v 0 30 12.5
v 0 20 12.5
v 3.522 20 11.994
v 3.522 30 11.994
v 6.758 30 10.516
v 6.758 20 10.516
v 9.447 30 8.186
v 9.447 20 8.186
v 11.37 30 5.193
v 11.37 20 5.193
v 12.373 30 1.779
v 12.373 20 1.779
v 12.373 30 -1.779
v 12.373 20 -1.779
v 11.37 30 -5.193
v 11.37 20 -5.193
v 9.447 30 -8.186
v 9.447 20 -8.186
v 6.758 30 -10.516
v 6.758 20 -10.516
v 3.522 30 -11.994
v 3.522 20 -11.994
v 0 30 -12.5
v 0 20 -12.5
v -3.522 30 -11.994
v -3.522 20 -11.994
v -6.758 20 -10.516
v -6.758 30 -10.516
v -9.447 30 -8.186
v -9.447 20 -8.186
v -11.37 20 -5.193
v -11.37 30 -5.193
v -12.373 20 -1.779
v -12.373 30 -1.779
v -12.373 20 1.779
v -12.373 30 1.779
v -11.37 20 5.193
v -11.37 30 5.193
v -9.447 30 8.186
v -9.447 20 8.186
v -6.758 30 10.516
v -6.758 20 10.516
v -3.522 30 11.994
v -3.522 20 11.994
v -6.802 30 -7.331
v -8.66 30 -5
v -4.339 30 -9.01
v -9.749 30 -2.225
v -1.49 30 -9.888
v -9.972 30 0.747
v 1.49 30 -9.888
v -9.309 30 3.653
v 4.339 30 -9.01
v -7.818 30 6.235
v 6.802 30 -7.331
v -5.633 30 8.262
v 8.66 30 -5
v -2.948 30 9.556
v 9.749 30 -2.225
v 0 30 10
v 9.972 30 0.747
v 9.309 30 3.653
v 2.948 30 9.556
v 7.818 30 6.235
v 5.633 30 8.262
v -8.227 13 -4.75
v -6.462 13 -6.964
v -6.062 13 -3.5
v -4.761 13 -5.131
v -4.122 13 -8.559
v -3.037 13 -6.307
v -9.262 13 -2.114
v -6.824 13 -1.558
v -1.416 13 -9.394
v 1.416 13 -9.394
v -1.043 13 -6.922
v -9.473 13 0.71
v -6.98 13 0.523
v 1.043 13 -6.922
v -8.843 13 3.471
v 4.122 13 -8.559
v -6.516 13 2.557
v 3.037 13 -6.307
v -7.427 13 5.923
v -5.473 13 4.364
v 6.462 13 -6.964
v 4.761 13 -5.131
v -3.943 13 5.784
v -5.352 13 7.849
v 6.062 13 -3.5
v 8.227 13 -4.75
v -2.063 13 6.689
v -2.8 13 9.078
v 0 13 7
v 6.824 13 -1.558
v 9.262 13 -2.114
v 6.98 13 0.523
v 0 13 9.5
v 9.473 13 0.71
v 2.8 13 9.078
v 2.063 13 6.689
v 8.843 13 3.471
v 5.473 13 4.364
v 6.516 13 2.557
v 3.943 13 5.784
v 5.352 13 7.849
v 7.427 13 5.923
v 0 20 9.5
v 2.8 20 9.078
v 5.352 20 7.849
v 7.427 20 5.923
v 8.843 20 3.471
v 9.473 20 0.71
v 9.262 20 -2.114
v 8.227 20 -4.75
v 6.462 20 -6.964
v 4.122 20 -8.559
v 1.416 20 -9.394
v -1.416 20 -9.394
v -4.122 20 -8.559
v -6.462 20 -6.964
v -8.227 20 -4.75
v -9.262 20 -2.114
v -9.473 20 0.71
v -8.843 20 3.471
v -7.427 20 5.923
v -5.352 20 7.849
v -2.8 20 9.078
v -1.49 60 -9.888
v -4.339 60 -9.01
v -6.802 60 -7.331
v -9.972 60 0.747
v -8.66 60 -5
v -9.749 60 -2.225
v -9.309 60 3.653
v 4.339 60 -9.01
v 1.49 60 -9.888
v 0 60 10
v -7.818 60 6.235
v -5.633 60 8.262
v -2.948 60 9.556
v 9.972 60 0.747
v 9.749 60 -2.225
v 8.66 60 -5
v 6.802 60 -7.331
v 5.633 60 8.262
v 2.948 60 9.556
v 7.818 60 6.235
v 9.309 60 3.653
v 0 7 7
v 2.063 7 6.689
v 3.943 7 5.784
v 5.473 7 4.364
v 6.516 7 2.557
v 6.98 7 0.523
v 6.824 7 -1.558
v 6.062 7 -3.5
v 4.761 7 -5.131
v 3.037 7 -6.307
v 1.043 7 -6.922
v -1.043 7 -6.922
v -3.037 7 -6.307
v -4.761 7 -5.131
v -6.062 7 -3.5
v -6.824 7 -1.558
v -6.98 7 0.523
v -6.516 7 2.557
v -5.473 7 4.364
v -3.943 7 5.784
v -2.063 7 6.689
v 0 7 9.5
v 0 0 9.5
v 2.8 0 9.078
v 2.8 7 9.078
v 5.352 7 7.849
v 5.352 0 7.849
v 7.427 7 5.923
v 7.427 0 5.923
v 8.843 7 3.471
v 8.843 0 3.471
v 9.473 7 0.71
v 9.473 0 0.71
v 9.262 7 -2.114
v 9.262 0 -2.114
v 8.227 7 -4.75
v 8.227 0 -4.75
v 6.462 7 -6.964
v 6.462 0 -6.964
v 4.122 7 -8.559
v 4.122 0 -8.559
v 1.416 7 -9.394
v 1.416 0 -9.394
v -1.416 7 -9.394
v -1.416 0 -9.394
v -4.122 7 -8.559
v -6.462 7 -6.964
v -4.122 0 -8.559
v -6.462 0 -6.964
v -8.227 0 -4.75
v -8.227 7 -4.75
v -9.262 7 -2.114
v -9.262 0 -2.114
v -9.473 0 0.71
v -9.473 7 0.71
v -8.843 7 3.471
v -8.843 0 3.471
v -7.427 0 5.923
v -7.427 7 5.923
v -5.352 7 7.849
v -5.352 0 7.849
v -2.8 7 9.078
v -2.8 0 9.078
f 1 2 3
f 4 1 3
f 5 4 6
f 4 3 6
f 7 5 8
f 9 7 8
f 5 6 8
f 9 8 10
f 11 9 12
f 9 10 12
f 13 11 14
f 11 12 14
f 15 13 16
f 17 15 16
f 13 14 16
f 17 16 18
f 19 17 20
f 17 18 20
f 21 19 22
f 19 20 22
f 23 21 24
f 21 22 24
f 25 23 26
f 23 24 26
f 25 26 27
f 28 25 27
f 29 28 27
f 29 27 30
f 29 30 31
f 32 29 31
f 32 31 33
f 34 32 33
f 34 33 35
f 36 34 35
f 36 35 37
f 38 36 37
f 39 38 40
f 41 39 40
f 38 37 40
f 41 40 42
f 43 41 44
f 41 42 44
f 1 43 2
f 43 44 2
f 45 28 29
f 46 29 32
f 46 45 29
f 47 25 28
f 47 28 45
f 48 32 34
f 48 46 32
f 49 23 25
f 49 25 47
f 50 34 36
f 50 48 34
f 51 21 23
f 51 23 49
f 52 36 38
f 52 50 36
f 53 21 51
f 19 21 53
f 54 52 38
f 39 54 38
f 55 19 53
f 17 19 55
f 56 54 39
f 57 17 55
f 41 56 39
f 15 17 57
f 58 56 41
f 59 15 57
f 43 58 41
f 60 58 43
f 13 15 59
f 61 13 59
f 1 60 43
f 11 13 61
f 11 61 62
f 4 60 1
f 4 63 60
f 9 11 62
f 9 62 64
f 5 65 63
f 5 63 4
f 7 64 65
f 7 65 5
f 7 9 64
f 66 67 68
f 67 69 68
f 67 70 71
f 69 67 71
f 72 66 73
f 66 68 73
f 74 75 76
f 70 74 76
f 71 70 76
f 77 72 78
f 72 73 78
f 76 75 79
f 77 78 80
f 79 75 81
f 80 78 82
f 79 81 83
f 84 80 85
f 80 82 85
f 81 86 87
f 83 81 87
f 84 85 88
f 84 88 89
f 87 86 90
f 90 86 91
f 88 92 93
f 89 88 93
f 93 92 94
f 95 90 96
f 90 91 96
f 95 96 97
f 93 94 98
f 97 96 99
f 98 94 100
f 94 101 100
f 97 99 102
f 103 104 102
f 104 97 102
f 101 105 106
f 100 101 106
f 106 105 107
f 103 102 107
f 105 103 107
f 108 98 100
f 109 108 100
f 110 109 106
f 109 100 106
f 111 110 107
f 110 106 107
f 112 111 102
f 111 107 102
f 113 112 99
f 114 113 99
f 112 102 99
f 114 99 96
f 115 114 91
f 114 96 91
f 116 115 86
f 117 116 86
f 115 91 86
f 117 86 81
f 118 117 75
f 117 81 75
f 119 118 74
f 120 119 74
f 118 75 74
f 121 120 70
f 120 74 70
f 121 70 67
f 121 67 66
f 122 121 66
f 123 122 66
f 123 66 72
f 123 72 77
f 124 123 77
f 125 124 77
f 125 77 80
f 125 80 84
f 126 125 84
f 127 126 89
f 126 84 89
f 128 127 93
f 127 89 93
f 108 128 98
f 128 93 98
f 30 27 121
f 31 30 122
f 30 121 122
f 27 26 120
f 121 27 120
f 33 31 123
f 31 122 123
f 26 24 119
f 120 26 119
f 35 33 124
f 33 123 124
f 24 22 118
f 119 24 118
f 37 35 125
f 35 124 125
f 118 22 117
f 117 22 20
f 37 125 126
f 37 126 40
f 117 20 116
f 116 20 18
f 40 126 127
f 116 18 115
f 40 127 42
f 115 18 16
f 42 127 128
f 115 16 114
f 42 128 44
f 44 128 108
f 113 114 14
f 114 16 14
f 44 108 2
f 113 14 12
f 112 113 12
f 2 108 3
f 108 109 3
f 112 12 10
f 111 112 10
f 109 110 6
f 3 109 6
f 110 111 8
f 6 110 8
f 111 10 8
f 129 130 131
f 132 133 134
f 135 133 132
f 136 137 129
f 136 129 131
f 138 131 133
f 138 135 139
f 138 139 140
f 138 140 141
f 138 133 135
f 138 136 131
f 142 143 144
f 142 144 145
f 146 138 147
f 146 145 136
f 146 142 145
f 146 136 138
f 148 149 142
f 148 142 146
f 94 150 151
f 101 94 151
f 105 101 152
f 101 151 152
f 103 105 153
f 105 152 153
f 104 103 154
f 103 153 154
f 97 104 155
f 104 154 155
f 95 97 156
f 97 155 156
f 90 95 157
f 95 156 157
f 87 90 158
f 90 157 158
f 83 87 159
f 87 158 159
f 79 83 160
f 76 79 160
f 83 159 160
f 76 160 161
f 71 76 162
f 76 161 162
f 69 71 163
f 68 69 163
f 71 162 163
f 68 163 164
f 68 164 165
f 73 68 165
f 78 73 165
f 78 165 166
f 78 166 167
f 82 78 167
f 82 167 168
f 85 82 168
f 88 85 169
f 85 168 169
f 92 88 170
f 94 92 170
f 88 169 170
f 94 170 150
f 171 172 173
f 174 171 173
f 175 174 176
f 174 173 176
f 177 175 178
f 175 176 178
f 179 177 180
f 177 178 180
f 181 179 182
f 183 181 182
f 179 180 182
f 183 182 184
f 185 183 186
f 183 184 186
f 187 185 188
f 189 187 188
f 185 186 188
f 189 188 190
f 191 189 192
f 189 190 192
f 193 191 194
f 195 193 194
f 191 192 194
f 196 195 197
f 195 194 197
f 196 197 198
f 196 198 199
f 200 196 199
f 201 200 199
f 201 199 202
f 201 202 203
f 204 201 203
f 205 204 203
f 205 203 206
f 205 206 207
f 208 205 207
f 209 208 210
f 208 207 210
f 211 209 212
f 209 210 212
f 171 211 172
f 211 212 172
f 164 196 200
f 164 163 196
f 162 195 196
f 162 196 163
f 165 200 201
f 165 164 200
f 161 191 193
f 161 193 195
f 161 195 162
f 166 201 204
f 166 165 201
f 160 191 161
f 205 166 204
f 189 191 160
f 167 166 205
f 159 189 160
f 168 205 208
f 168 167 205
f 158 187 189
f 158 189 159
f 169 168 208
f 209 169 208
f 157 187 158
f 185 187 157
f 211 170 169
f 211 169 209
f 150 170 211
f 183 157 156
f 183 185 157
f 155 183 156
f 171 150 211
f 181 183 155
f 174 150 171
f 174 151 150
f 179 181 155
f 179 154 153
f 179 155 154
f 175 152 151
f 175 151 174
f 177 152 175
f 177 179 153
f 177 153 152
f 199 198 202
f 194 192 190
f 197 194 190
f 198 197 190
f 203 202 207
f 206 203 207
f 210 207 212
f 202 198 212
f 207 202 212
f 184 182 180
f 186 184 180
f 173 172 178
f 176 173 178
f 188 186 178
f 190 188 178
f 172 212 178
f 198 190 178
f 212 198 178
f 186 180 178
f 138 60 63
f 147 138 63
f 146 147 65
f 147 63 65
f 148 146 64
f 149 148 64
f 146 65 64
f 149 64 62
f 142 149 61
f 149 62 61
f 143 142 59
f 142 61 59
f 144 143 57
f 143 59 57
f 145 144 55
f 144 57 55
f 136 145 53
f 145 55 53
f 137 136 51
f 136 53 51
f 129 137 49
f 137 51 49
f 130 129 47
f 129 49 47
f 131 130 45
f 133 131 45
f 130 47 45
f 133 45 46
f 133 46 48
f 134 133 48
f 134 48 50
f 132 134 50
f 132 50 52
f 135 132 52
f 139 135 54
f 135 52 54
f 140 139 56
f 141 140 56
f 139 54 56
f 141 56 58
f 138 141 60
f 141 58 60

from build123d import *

# Parameters (mm, degrees)
SKETCH_1_R      = 9.5
EXTRUDE_1_DEPTH = 7
EXTRUDE_START   = 7
SKETCH_2_R      = 7
EXTRUDE_2_DEPTH = 6
EXTRUDE_START_2 = 13
SKETCH_3_R      = 9.5
EXTRUDE_3_DEPTH = 7
EXTRUDE_START_3 = 20
SKETCH_4_R      = 12.5
EXTRUDE_4_DEPTH = 10
EXTRUDE_START_4 = 30
SKETCH_5_R      = 10
EXTRUDE_5_DEPTH = 30


with BuildPart() as part:
    # 草图1 → 凸台-拉伸1 (new body)
    with BuildSketch(Plane(origin=(0, 0, 0), x_dir=(1, 0, 0), z_dir=(0, 1, 0))):
        with Locations(Location((0, 0, 0), (0, 0, 270))):
            Circle(SKETCH_1_R)
    extrude(amount=EXTRUDE_1_DEPTH)

    # 草图2 → 凸台-拉伸2 (add)
    with BuildSketch(Plane(origin=(0, 0, 0), x_dir=(1, 0, 0), z_dir=(0, 1, 0)).offset(EXTRUDE_START)):
        with Locations(Location((0, 0, 0), (0, 0, 270))):
            Circle(SKETCH_2_R)
    extrude(amount=EXTRUDE_2_DEPTH)

    # 草图3 → 凸台-拉伸3 (add)
    with BuildSketch(Plane(origin=(0, 0, 0), x_dir=(1, 0, 0), z_dir=(0, 1, 0)).offset(EXTRUDE_START_2)):
        with Locations(Location((0, 0, 0), (0, 0, 270))):
            Circle(SKETCH_3_R)
    extrude(amount=EXTRUDE_3_DEPTH)

    # 草图4 → 凸台-拉伸4 (add)
    with BuildSketch(Plane(origin=(0, 0, 0), x_dir=(1, 0, 0), z_dir=(0, 1, 0)).offset(EXTRUDE_START_3)):
        with Locations(Location((0, 0, 0), (0, 0, 270))):
            Circle(SKETCH_4_R)
    extrude(amount=EXTRUDE_4_DEPTH)

    # 草图5 → 凸台-拉伸5 (add)
    with BuildSketch(Plane(origin=(0, 0, 0), x_dir=(1, 0, 0), z_dir=(0, 1, 0)).offset(EXTRUDE_START_4)):
        with Locations(Location((0, 0, 0), (0, 0, 270))):
            Circle(SKETCH_5_R)
    extrude(amount=EXTRUDE_5_DEPTH)


solid = part.part
